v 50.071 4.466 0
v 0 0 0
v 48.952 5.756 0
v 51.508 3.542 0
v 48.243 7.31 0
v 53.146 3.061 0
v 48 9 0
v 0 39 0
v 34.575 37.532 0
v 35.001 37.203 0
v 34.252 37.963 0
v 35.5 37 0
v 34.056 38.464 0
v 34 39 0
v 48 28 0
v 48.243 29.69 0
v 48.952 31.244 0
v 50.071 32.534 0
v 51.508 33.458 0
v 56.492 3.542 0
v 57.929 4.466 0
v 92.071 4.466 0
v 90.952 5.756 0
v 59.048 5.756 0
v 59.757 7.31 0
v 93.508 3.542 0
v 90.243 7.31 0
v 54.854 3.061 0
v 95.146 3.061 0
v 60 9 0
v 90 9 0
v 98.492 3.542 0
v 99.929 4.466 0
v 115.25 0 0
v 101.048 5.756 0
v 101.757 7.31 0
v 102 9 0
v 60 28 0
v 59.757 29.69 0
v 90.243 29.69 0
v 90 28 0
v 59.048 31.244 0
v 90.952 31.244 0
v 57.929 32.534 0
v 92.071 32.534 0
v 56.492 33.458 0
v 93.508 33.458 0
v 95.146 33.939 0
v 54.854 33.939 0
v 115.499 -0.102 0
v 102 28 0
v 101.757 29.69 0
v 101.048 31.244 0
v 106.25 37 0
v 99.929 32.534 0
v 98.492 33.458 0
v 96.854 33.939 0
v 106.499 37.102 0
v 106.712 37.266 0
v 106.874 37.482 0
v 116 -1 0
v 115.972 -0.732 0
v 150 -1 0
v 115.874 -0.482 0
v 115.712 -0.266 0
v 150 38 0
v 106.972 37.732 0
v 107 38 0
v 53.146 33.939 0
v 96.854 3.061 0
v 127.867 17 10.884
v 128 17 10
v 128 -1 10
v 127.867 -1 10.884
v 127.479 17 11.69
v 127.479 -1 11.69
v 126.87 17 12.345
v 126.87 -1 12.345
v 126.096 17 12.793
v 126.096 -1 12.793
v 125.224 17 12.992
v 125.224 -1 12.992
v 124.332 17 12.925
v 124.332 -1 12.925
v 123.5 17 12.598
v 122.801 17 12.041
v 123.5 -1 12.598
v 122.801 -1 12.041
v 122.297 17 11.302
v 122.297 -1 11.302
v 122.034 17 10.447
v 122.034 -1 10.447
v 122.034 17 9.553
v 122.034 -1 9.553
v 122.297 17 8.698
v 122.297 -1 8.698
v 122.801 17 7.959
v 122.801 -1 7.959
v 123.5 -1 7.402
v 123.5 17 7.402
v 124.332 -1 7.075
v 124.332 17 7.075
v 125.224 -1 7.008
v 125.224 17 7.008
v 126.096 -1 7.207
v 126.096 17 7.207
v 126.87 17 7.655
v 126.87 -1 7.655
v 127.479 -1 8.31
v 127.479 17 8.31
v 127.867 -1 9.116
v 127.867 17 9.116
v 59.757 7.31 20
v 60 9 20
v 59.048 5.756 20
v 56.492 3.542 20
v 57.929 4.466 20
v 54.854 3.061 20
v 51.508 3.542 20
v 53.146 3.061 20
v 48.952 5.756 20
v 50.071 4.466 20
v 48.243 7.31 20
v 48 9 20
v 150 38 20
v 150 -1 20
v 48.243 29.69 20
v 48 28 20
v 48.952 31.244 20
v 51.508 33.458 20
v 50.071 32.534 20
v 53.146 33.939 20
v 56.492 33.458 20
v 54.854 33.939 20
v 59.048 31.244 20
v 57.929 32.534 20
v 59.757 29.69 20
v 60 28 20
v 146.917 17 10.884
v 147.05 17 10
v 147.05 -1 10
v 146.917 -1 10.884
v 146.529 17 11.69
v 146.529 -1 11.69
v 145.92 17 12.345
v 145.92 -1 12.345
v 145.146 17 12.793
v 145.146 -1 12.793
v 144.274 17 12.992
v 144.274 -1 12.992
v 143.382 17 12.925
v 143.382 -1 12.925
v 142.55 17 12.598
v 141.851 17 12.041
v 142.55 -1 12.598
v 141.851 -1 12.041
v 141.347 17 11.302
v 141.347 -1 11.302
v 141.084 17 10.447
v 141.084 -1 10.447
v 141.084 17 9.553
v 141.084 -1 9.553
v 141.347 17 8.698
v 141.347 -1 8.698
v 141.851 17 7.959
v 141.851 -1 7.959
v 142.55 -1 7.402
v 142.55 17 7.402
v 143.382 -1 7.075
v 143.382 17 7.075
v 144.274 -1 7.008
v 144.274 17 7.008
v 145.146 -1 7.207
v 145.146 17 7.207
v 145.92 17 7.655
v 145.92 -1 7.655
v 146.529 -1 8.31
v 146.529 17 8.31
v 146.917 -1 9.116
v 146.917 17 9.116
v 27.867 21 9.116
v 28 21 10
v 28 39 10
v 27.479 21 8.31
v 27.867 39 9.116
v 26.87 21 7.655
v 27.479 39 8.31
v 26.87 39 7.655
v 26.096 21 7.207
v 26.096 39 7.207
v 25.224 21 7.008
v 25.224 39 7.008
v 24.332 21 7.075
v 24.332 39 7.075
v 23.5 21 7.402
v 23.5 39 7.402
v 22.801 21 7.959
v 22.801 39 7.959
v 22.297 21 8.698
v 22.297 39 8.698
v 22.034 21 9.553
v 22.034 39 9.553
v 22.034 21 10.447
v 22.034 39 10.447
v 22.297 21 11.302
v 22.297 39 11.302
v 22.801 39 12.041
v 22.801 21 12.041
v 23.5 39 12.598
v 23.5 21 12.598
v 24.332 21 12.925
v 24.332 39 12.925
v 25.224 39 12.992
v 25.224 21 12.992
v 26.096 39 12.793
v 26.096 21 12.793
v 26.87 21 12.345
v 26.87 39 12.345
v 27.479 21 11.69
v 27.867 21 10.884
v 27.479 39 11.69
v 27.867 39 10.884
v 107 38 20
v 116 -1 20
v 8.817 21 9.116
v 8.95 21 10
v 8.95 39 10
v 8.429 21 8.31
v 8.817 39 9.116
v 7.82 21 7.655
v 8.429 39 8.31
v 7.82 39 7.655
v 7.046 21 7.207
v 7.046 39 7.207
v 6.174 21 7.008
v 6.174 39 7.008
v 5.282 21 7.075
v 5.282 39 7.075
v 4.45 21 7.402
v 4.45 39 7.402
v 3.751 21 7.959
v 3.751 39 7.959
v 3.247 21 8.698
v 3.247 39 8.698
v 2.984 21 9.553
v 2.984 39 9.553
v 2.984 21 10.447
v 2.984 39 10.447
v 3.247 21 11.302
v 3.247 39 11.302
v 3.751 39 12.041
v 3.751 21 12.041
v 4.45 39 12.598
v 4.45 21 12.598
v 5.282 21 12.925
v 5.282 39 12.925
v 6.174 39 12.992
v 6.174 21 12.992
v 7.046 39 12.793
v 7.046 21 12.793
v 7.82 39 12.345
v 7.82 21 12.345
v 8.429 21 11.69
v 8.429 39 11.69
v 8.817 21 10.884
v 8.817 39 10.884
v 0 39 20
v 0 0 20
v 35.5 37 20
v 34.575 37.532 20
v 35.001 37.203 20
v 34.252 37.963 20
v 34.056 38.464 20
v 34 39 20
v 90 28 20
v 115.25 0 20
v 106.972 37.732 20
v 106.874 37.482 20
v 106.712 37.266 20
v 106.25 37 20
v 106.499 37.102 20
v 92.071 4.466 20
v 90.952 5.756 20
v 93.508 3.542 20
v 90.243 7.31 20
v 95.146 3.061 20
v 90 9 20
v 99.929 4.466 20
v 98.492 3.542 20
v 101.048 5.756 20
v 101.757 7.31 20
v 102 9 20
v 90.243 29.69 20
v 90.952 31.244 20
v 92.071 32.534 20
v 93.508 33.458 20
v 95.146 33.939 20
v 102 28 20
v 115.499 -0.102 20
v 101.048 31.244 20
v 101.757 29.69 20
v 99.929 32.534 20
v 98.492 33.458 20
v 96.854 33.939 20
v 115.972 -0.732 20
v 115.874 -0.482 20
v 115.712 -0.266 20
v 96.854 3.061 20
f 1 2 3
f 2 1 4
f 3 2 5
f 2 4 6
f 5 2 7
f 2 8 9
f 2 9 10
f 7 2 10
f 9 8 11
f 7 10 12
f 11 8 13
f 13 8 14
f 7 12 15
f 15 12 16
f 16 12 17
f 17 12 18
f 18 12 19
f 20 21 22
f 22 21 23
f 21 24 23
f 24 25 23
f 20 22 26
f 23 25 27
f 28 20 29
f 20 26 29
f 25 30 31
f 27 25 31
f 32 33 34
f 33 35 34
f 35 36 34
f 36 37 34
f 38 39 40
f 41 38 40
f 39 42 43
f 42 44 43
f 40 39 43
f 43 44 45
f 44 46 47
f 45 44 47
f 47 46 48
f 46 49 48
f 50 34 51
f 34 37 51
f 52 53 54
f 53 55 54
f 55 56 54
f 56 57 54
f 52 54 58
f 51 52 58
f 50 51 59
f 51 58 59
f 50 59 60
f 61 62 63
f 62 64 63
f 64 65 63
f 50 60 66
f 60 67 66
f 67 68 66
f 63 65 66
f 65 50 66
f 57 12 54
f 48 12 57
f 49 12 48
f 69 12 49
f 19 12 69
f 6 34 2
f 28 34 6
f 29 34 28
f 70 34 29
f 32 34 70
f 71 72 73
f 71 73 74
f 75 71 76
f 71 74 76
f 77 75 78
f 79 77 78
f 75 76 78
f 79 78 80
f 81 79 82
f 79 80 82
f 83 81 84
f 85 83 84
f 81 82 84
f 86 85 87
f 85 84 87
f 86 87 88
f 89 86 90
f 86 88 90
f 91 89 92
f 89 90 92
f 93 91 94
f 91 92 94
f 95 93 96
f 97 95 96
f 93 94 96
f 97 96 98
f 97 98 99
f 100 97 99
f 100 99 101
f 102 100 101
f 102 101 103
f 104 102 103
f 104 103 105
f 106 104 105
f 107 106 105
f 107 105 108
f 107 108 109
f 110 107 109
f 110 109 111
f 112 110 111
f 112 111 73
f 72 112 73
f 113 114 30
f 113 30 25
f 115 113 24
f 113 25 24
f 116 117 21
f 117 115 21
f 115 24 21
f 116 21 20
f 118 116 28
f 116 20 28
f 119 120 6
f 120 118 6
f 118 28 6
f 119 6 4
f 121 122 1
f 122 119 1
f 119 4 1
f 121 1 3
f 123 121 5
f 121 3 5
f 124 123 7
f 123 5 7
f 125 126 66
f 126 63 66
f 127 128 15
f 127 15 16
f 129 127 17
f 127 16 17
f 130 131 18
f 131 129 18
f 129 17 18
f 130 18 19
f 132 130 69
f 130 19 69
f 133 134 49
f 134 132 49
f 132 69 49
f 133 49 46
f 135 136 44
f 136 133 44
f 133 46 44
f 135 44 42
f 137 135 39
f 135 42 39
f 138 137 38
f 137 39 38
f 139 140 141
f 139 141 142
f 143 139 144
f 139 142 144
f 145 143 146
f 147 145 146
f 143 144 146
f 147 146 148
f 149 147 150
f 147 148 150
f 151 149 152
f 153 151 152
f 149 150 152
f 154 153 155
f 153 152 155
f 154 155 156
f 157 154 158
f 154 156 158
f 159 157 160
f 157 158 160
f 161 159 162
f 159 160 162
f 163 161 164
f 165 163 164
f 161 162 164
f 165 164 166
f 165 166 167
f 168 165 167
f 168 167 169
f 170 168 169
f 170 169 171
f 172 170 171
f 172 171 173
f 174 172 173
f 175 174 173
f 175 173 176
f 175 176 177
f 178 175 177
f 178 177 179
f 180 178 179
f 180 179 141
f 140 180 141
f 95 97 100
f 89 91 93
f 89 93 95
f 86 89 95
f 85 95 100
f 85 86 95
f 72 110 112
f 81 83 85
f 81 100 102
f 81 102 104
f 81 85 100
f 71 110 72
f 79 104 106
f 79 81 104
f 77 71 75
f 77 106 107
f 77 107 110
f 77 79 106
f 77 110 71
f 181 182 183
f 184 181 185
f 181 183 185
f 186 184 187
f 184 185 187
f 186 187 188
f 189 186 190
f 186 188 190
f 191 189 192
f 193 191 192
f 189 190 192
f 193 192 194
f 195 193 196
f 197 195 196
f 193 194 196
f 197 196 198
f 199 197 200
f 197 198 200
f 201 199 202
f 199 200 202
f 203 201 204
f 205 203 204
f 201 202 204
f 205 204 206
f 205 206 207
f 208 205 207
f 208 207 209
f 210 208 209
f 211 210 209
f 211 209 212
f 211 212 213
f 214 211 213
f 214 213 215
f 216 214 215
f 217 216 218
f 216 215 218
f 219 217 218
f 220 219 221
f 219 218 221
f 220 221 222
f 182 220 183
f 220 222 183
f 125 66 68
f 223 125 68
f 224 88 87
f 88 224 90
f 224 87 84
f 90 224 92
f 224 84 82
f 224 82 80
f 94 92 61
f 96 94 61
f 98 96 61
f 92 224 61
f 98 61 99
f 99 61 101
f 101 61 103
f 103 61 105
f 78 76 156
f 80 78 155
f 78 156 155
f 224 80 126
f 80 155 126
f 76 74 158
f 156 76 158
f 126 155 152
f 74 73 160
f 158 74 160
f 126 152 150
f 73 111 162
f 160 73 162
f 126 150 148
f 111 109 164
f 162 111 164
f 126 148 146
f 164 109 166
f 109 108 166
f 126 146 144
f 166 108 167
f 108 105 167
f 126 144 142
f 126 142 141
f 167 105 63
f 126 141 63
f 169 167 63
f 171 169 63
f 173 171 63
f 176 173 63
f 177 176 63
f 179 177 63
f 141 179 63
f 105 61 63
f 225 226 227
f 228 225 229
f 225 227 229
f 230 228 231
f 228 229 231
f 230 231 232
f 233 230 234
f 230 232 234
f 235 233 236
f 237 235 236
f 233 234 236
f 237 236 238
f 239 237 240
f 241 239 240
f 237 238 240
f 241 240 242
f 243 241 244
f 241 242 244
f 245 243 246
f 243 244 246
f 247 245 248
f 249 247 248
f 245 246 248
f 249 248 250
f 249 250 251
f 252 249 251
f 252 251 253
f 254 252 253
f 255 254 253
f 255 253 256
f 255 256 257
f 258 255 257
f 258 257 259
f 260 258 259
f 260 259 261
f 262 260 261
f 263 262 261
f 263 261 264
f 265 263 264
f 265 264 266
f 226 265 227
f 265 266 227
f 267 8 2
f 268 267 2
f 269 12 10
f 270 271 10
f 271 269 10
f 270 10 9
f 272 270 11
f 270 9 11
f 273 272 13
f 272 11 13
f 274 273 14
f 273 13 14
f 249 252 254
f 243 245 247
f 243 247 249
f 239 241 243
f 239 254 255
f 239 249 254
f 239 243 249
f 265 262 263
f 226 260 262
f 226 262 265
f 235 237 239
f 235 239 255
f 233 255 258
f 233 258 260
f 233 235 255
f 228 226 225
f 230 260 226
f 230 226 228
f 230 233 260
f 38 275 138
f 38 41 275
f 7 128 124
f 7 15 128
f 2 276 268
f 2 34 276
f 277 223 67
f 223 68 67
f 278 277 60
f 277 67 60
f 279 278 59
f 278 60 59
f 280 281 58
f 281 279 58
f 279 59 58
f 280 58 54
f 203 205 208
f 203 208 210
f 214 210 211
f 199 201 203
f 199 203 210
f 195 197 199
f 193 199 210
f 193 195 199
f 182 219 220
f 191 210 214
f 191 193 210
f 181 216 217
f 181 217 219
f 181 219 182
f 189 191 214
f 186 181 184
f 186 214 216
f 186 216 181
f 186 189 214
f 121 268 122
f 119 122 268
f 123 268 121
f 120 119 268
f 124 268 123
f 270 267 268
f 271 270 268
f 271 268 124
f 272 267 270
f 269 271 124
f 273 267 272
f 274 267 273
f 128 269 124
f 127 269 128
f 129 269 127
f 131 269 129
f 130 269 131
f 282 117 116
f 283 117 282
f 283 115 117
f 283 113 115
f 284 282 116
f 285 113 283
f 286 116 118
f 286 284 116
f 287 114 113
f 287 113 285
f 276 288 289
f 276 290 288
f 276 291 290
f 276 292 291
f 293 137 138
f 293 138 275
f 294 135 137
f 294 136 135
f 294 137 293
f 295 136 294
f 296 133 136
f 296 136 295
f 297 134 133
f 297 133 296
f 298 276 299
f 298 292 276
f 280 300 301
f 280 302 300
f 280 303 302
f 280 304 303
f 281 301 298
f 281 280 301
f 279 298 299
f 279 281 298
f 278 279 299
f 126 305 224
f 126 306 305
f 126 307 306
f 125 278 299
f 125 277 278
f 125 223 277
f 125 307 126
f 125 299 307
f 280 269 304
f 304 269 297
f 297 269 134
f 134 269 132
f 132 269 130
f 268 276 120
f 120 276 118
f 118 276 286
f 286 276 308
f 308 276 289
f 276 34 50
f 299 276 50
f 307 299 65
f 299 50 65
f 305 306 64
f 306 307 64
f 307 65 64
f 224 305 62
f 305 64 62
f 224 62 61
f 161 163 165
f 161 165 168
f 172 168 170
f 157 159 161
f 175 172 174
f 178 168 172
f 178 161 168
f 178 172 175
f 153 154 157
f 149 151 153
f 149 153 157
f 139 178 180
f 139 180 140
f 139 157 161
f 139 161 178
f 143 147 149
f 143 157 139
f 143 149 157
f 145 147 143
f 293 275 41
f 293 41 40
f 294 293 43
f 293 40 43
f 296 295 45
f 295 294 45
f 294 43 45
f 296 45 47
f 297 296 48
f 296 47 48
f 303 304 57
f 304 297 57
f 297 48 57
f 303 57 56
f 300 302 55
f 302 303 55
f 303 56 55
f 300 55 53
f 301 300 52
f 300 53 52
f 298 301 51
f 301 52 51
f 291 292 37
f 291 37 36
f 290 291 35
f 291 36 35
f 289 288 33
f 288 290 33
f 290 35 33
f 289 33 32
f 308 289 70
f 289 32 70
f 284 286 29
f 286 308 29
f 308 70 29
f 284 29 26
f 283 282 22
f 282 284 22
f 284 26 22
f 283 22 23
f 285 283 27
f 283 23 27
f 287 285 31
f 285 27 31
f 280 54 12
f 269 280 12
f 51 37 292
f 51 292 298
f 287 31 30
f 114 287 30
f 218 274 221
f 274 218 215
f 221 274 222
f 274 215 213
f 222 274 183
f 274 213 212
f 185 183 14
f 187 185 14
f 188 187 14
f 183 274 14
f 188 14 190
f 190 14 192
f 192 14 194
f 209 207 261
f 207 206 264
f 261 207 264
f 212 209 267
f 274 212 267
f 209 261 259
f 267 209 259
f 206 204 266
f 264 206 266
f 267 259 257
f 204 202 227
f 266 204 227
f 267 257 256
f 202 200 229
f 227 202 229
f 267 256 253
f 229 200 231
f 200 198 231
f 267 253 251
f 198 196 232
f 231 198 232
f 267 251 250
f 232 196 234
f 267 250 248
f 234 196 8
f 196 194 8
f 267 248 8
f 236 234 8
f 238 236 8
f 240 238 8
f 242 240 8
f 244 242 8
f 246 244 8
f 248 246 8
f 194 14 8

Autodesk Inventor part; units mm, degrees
ref_plane "YZ Plane" through (0, 0, 0) normal (1, 0, 0) x (0, 1, 0)
ref_plane "XZ Plane" through (0, 0, 0) normal (0, 1, 0) x (-1, 0, 0)
ref_plane "XY Plane" through (0, 0, 0) normal (0, 0, 1) x (1, 0, 0)
sketch "Sketch1" plane through (0, 0, 0) normal (0, 0, 1) x (1, 0, 0)
  line L0 (0, 0) -> (150, 0) construction
  line L1 (150, 0) -> (150, 39) construction
  line L2 (150, 39) -> (0, 39) construction
  line L3 (0, 38) -> (150, 38) construction
  line L4 (0, 37) -> (150, 37) construction
  arc A0 (106.25, 37) -> (107, 38) centre (106.0005, 37.9684) ccw
  arc A1 (34, 39) -> (35.5, 37) centre (35.999, 38.9367) ccw
  line L5 (0, -1) -> (150, -1) construction
  arc A2 (116, -1) -> (115.25, 0) centre (115.0005, -0.9684) ccw
  line L6 (75, 37) -> (75, 0) construction
  line L7 (0, 18.5) -> (150, 18.5) construction
  line L8 (75, 28) -> (60, 28)
  arc A3 (60, 28) -> (48, 28) centre (54, 28) ccw
  line L9 (48, 28) -> (48, 18.5)
  line L10 (75, 28) -> (90, 28)
  arc A4 (102, 28) -> (90, 28) centre (96, 28) ccw
  line L11 (102, 28) -> (102, 18.5)
  line L12 (75, 9) -> (60, 9)
  arc A5 (48, 9) -> (60, 9) centre (54, 9) ccw
  line L13 (48, 9) -> (48, 18.5)
  arc A6 (90, 9) -> (102, 9) centre (96, 9) ccw
  line L14 (75, 9) -> (90, 9)
  line L15 (102, 9) -> (102, 18.5)
  line L16 (0, 39) -> (0, 0)
  line L17 (115.25, 0) -> (0, 0)
  line L18 (116, -1) -> (150, -1)
  line L19 (150, -1) -> (150, 38)
  line L20 (150, 38) -> (107, 38)
  line L21 (106.25, 37) -> (35.5, 37)
  line L22 (34, 39) -> (0, 39)
  dimension "d0" = 150
  dimension "d1" = 39
  dimension "d9" = 34
  dimension "d11" = 1
  dimension "d17" = 1
  dimension "d18" = 43
  dimension "d19" = 1.25
  dimension "d20" = 1
  dimension "d21" = 2.5
  dimension "d22" = 2
  dimension "d23" = 1
  dimension "d24" = 34
  dimension "d25" = 1.25
  dimension "d26" = 1
  dimension "d27" = 15
  dimension "d29" = 12
  dimension "d30" = 6
extrude "Extrusion1" add sketch "Sketch1" along normal blind 20
sketch "Sketch2" plane through (116, -1, 0) normal (0, -1, 0) x (1, 0, 0)
  line L0 (0, 20) -> (34, 20) construction
  line L1 (0, 0) -> (34, 0) construction
  line L2 (34, 0) -> (34, 20) construction
  line L3 (34, 20) -> (0, 20) construction
  line L4 (0, 20) -> (0, 0) construction
  circle A0 centre (9, 10) radius 3
  circle A1 centre (28.05, 10) radius 3
  line L5 (-116, 0) -> (-116, 20) construction
  line L6 (34, 0) -> (0, 0) construction
  line L7 (-116, 20) -> (34, 20) construction
  line L8 (34, 20) -> (34, 0) construction
  line L9 (34, 0) -> (-116, 0) construction
  line L10 (-116, 0) -> (-116, 20) construction
  line L11 (-116, 20) -> (-0.75, 20) construction
  dimension "d33" = 6
  dimension "d34" = 10
  dimension "d35" = 25
  dimension "d36" = 6
  dimension "d37" = 19.05
extrude "Extrusion4" cut sketch "Sketch2" against normal blind 18
sketch "Sketch3" plane through (0, 39, 0) normal (0, 1, 0) x (1, 0, 0)
  line L0 (150, 0) -> (150, -20) construction
  line L1 (0, 0) -> (150, 0) construction
  line L2 (150, 0) -> (150, -20) construction
  line L3 (150, -20) -> (0, -20) construction
  line L4 (0, -20) -> (0, 0) construction
  circle A0 centre (5.95, -10) radius 3
  circle A1 centre (25, -10) radius 3
  dimension "d45" = 6
  dimension "d46" = 6
  dimension "d47" = 19.05
  dimension "d51" = 125
  dimension "d52" = 10
  dimension "d53" = 10
extrude "Extrusion5" cut sketch "Sketch3" against normal blind 18
thread "Thread1" size "M6x1" class "6H" standard "ANSI Metric M Profile" full length
thread "Thread2" size "M6x1" class "6H" standard "ANSI Metric M Profile" full length
thread "Thread3" size "M6x1" class "6H" standard "ANSI Metric M Profile" full length
thread "Thread4" size "M6x1" class "6H" standard "ANSI Metric M Profile" full length
equation "\"d0\" = lcl"
equation "\"d1\" = lch1"
equation "\"d9\" = lcwd2"
equation "\"d11\" = lch2 - lch1"
equation "\"d17\" = lch2 - lch1"
equation "\"d18\" = lcwd3"
equation "\"d23\" = lch2 - lch1"
equation "\"d24\" = lcwd2"
equation "\"d31\" = lcw"
equation "\"d33\" = dia1"
equation "\"d34\" = 0.5 * lcw"
equation "\"d35\" = lcwd1"
equation "\"d36\" = dia1"
equation "\"d37\" = lcsd"
equation "\"d43\" = td"
equation "\"d45\" = d48"
equation "\"d46\" = d48"
equation "\"d47\" = d49"
equation "\"d51\" = lcl - lcwd1"
equation "\"d52\" = 0.5 * lcw"
equation "\"d53\" = 0.5 * lcw"
equation "\"d54\" = td"
equation "\"dias\" = 8.8"
equation "\"stra1\" = 9.5"
equation "\"diab2\" = 6"
equation "\"stra\" = 25"
equation "\"db1\" = 6"
equation "\"ds1\" = 5.8"
equation "\"ds2\" = 1.6"
equation "\"ang\" = 120deg"
equation "\"db2\" = 3"
equation "\"diab3\" = 7"
equation "\"diab4\" = 3"
equation "\"dias1\" = 13.4375"
equation "\"dias3\" = 2"
equation "\"dias4\" = 4"
equation "\"t1\" = 3"
equation "\"t2\" = 3"
equation "\"t3\" = 6"
equation "\"t4\" = 6"
equation "\"t5\" = 3"
equation "\"diab1\" = 19"
equation "\"afw\" = 0.2"
equation "\"lcsd\" = 19.05"
equation "\"lcwd1\" = 25"
equation "\"lcwd2\" = 34"
equation "\"lcw\" = 20"
equation "\"lch1\" = 39"
equation "\"lch2\" = 40"
equation "\"lcl\" = 150"
equation "\"lcwd3\" = 43"
equation "\"dia1\" = 6"
equation "\"td\" = 18"
equation "\"d48\" = 6"
equation "\"d49\" = 19.05"
equation "\"bhh\" = 6"
equation "\"sw\" = 25"
equation "\"spacert\" = 2"
equation "\"sh\" = 31"
equation "\"pvct\" = 5"
equation "\"dia3\" = 8"
equation "\"dia4\" = 11"
equation "\"tankl\" = 379"
equation "\"play\" = 9"
equation "\"holeh\" = 26"
equation "\"surroundt\" = 5"
equation "\"slack\" = 0.5"
equation "\"play2\" = 3"
equation "\"diaoverflow\" = 25"
equation "\"diaph\" = 32"
equation "\"diawater\" = 25"
equation "\"diacucl\" = 32"
equation "\"diaair\" = 32"
equation "\"diasurroundhole\" = 42"
equation "\"diagrate\" = 12"
equation "\"gratespacing\" = 12.02082"
equation "\"bottomdist\" = 9.6355"
equation "\"sidedist\" = 13.9375"
equation "\"diahcl\" = 32"
equation "\"bracketwtop\" = 6"
equation "\"bracketwbottom\" = 6"
equation "\"nett\" = 1"
equation "\"nethole\" = 16"
equation "\"netside\" = 3.5"
equation "\"nettop\" = 7"
equation "\"netholespacing\" = 2"
equation "\"diaetape\" = 32"
properties part number "load cell" material "Aluminum 6061"
